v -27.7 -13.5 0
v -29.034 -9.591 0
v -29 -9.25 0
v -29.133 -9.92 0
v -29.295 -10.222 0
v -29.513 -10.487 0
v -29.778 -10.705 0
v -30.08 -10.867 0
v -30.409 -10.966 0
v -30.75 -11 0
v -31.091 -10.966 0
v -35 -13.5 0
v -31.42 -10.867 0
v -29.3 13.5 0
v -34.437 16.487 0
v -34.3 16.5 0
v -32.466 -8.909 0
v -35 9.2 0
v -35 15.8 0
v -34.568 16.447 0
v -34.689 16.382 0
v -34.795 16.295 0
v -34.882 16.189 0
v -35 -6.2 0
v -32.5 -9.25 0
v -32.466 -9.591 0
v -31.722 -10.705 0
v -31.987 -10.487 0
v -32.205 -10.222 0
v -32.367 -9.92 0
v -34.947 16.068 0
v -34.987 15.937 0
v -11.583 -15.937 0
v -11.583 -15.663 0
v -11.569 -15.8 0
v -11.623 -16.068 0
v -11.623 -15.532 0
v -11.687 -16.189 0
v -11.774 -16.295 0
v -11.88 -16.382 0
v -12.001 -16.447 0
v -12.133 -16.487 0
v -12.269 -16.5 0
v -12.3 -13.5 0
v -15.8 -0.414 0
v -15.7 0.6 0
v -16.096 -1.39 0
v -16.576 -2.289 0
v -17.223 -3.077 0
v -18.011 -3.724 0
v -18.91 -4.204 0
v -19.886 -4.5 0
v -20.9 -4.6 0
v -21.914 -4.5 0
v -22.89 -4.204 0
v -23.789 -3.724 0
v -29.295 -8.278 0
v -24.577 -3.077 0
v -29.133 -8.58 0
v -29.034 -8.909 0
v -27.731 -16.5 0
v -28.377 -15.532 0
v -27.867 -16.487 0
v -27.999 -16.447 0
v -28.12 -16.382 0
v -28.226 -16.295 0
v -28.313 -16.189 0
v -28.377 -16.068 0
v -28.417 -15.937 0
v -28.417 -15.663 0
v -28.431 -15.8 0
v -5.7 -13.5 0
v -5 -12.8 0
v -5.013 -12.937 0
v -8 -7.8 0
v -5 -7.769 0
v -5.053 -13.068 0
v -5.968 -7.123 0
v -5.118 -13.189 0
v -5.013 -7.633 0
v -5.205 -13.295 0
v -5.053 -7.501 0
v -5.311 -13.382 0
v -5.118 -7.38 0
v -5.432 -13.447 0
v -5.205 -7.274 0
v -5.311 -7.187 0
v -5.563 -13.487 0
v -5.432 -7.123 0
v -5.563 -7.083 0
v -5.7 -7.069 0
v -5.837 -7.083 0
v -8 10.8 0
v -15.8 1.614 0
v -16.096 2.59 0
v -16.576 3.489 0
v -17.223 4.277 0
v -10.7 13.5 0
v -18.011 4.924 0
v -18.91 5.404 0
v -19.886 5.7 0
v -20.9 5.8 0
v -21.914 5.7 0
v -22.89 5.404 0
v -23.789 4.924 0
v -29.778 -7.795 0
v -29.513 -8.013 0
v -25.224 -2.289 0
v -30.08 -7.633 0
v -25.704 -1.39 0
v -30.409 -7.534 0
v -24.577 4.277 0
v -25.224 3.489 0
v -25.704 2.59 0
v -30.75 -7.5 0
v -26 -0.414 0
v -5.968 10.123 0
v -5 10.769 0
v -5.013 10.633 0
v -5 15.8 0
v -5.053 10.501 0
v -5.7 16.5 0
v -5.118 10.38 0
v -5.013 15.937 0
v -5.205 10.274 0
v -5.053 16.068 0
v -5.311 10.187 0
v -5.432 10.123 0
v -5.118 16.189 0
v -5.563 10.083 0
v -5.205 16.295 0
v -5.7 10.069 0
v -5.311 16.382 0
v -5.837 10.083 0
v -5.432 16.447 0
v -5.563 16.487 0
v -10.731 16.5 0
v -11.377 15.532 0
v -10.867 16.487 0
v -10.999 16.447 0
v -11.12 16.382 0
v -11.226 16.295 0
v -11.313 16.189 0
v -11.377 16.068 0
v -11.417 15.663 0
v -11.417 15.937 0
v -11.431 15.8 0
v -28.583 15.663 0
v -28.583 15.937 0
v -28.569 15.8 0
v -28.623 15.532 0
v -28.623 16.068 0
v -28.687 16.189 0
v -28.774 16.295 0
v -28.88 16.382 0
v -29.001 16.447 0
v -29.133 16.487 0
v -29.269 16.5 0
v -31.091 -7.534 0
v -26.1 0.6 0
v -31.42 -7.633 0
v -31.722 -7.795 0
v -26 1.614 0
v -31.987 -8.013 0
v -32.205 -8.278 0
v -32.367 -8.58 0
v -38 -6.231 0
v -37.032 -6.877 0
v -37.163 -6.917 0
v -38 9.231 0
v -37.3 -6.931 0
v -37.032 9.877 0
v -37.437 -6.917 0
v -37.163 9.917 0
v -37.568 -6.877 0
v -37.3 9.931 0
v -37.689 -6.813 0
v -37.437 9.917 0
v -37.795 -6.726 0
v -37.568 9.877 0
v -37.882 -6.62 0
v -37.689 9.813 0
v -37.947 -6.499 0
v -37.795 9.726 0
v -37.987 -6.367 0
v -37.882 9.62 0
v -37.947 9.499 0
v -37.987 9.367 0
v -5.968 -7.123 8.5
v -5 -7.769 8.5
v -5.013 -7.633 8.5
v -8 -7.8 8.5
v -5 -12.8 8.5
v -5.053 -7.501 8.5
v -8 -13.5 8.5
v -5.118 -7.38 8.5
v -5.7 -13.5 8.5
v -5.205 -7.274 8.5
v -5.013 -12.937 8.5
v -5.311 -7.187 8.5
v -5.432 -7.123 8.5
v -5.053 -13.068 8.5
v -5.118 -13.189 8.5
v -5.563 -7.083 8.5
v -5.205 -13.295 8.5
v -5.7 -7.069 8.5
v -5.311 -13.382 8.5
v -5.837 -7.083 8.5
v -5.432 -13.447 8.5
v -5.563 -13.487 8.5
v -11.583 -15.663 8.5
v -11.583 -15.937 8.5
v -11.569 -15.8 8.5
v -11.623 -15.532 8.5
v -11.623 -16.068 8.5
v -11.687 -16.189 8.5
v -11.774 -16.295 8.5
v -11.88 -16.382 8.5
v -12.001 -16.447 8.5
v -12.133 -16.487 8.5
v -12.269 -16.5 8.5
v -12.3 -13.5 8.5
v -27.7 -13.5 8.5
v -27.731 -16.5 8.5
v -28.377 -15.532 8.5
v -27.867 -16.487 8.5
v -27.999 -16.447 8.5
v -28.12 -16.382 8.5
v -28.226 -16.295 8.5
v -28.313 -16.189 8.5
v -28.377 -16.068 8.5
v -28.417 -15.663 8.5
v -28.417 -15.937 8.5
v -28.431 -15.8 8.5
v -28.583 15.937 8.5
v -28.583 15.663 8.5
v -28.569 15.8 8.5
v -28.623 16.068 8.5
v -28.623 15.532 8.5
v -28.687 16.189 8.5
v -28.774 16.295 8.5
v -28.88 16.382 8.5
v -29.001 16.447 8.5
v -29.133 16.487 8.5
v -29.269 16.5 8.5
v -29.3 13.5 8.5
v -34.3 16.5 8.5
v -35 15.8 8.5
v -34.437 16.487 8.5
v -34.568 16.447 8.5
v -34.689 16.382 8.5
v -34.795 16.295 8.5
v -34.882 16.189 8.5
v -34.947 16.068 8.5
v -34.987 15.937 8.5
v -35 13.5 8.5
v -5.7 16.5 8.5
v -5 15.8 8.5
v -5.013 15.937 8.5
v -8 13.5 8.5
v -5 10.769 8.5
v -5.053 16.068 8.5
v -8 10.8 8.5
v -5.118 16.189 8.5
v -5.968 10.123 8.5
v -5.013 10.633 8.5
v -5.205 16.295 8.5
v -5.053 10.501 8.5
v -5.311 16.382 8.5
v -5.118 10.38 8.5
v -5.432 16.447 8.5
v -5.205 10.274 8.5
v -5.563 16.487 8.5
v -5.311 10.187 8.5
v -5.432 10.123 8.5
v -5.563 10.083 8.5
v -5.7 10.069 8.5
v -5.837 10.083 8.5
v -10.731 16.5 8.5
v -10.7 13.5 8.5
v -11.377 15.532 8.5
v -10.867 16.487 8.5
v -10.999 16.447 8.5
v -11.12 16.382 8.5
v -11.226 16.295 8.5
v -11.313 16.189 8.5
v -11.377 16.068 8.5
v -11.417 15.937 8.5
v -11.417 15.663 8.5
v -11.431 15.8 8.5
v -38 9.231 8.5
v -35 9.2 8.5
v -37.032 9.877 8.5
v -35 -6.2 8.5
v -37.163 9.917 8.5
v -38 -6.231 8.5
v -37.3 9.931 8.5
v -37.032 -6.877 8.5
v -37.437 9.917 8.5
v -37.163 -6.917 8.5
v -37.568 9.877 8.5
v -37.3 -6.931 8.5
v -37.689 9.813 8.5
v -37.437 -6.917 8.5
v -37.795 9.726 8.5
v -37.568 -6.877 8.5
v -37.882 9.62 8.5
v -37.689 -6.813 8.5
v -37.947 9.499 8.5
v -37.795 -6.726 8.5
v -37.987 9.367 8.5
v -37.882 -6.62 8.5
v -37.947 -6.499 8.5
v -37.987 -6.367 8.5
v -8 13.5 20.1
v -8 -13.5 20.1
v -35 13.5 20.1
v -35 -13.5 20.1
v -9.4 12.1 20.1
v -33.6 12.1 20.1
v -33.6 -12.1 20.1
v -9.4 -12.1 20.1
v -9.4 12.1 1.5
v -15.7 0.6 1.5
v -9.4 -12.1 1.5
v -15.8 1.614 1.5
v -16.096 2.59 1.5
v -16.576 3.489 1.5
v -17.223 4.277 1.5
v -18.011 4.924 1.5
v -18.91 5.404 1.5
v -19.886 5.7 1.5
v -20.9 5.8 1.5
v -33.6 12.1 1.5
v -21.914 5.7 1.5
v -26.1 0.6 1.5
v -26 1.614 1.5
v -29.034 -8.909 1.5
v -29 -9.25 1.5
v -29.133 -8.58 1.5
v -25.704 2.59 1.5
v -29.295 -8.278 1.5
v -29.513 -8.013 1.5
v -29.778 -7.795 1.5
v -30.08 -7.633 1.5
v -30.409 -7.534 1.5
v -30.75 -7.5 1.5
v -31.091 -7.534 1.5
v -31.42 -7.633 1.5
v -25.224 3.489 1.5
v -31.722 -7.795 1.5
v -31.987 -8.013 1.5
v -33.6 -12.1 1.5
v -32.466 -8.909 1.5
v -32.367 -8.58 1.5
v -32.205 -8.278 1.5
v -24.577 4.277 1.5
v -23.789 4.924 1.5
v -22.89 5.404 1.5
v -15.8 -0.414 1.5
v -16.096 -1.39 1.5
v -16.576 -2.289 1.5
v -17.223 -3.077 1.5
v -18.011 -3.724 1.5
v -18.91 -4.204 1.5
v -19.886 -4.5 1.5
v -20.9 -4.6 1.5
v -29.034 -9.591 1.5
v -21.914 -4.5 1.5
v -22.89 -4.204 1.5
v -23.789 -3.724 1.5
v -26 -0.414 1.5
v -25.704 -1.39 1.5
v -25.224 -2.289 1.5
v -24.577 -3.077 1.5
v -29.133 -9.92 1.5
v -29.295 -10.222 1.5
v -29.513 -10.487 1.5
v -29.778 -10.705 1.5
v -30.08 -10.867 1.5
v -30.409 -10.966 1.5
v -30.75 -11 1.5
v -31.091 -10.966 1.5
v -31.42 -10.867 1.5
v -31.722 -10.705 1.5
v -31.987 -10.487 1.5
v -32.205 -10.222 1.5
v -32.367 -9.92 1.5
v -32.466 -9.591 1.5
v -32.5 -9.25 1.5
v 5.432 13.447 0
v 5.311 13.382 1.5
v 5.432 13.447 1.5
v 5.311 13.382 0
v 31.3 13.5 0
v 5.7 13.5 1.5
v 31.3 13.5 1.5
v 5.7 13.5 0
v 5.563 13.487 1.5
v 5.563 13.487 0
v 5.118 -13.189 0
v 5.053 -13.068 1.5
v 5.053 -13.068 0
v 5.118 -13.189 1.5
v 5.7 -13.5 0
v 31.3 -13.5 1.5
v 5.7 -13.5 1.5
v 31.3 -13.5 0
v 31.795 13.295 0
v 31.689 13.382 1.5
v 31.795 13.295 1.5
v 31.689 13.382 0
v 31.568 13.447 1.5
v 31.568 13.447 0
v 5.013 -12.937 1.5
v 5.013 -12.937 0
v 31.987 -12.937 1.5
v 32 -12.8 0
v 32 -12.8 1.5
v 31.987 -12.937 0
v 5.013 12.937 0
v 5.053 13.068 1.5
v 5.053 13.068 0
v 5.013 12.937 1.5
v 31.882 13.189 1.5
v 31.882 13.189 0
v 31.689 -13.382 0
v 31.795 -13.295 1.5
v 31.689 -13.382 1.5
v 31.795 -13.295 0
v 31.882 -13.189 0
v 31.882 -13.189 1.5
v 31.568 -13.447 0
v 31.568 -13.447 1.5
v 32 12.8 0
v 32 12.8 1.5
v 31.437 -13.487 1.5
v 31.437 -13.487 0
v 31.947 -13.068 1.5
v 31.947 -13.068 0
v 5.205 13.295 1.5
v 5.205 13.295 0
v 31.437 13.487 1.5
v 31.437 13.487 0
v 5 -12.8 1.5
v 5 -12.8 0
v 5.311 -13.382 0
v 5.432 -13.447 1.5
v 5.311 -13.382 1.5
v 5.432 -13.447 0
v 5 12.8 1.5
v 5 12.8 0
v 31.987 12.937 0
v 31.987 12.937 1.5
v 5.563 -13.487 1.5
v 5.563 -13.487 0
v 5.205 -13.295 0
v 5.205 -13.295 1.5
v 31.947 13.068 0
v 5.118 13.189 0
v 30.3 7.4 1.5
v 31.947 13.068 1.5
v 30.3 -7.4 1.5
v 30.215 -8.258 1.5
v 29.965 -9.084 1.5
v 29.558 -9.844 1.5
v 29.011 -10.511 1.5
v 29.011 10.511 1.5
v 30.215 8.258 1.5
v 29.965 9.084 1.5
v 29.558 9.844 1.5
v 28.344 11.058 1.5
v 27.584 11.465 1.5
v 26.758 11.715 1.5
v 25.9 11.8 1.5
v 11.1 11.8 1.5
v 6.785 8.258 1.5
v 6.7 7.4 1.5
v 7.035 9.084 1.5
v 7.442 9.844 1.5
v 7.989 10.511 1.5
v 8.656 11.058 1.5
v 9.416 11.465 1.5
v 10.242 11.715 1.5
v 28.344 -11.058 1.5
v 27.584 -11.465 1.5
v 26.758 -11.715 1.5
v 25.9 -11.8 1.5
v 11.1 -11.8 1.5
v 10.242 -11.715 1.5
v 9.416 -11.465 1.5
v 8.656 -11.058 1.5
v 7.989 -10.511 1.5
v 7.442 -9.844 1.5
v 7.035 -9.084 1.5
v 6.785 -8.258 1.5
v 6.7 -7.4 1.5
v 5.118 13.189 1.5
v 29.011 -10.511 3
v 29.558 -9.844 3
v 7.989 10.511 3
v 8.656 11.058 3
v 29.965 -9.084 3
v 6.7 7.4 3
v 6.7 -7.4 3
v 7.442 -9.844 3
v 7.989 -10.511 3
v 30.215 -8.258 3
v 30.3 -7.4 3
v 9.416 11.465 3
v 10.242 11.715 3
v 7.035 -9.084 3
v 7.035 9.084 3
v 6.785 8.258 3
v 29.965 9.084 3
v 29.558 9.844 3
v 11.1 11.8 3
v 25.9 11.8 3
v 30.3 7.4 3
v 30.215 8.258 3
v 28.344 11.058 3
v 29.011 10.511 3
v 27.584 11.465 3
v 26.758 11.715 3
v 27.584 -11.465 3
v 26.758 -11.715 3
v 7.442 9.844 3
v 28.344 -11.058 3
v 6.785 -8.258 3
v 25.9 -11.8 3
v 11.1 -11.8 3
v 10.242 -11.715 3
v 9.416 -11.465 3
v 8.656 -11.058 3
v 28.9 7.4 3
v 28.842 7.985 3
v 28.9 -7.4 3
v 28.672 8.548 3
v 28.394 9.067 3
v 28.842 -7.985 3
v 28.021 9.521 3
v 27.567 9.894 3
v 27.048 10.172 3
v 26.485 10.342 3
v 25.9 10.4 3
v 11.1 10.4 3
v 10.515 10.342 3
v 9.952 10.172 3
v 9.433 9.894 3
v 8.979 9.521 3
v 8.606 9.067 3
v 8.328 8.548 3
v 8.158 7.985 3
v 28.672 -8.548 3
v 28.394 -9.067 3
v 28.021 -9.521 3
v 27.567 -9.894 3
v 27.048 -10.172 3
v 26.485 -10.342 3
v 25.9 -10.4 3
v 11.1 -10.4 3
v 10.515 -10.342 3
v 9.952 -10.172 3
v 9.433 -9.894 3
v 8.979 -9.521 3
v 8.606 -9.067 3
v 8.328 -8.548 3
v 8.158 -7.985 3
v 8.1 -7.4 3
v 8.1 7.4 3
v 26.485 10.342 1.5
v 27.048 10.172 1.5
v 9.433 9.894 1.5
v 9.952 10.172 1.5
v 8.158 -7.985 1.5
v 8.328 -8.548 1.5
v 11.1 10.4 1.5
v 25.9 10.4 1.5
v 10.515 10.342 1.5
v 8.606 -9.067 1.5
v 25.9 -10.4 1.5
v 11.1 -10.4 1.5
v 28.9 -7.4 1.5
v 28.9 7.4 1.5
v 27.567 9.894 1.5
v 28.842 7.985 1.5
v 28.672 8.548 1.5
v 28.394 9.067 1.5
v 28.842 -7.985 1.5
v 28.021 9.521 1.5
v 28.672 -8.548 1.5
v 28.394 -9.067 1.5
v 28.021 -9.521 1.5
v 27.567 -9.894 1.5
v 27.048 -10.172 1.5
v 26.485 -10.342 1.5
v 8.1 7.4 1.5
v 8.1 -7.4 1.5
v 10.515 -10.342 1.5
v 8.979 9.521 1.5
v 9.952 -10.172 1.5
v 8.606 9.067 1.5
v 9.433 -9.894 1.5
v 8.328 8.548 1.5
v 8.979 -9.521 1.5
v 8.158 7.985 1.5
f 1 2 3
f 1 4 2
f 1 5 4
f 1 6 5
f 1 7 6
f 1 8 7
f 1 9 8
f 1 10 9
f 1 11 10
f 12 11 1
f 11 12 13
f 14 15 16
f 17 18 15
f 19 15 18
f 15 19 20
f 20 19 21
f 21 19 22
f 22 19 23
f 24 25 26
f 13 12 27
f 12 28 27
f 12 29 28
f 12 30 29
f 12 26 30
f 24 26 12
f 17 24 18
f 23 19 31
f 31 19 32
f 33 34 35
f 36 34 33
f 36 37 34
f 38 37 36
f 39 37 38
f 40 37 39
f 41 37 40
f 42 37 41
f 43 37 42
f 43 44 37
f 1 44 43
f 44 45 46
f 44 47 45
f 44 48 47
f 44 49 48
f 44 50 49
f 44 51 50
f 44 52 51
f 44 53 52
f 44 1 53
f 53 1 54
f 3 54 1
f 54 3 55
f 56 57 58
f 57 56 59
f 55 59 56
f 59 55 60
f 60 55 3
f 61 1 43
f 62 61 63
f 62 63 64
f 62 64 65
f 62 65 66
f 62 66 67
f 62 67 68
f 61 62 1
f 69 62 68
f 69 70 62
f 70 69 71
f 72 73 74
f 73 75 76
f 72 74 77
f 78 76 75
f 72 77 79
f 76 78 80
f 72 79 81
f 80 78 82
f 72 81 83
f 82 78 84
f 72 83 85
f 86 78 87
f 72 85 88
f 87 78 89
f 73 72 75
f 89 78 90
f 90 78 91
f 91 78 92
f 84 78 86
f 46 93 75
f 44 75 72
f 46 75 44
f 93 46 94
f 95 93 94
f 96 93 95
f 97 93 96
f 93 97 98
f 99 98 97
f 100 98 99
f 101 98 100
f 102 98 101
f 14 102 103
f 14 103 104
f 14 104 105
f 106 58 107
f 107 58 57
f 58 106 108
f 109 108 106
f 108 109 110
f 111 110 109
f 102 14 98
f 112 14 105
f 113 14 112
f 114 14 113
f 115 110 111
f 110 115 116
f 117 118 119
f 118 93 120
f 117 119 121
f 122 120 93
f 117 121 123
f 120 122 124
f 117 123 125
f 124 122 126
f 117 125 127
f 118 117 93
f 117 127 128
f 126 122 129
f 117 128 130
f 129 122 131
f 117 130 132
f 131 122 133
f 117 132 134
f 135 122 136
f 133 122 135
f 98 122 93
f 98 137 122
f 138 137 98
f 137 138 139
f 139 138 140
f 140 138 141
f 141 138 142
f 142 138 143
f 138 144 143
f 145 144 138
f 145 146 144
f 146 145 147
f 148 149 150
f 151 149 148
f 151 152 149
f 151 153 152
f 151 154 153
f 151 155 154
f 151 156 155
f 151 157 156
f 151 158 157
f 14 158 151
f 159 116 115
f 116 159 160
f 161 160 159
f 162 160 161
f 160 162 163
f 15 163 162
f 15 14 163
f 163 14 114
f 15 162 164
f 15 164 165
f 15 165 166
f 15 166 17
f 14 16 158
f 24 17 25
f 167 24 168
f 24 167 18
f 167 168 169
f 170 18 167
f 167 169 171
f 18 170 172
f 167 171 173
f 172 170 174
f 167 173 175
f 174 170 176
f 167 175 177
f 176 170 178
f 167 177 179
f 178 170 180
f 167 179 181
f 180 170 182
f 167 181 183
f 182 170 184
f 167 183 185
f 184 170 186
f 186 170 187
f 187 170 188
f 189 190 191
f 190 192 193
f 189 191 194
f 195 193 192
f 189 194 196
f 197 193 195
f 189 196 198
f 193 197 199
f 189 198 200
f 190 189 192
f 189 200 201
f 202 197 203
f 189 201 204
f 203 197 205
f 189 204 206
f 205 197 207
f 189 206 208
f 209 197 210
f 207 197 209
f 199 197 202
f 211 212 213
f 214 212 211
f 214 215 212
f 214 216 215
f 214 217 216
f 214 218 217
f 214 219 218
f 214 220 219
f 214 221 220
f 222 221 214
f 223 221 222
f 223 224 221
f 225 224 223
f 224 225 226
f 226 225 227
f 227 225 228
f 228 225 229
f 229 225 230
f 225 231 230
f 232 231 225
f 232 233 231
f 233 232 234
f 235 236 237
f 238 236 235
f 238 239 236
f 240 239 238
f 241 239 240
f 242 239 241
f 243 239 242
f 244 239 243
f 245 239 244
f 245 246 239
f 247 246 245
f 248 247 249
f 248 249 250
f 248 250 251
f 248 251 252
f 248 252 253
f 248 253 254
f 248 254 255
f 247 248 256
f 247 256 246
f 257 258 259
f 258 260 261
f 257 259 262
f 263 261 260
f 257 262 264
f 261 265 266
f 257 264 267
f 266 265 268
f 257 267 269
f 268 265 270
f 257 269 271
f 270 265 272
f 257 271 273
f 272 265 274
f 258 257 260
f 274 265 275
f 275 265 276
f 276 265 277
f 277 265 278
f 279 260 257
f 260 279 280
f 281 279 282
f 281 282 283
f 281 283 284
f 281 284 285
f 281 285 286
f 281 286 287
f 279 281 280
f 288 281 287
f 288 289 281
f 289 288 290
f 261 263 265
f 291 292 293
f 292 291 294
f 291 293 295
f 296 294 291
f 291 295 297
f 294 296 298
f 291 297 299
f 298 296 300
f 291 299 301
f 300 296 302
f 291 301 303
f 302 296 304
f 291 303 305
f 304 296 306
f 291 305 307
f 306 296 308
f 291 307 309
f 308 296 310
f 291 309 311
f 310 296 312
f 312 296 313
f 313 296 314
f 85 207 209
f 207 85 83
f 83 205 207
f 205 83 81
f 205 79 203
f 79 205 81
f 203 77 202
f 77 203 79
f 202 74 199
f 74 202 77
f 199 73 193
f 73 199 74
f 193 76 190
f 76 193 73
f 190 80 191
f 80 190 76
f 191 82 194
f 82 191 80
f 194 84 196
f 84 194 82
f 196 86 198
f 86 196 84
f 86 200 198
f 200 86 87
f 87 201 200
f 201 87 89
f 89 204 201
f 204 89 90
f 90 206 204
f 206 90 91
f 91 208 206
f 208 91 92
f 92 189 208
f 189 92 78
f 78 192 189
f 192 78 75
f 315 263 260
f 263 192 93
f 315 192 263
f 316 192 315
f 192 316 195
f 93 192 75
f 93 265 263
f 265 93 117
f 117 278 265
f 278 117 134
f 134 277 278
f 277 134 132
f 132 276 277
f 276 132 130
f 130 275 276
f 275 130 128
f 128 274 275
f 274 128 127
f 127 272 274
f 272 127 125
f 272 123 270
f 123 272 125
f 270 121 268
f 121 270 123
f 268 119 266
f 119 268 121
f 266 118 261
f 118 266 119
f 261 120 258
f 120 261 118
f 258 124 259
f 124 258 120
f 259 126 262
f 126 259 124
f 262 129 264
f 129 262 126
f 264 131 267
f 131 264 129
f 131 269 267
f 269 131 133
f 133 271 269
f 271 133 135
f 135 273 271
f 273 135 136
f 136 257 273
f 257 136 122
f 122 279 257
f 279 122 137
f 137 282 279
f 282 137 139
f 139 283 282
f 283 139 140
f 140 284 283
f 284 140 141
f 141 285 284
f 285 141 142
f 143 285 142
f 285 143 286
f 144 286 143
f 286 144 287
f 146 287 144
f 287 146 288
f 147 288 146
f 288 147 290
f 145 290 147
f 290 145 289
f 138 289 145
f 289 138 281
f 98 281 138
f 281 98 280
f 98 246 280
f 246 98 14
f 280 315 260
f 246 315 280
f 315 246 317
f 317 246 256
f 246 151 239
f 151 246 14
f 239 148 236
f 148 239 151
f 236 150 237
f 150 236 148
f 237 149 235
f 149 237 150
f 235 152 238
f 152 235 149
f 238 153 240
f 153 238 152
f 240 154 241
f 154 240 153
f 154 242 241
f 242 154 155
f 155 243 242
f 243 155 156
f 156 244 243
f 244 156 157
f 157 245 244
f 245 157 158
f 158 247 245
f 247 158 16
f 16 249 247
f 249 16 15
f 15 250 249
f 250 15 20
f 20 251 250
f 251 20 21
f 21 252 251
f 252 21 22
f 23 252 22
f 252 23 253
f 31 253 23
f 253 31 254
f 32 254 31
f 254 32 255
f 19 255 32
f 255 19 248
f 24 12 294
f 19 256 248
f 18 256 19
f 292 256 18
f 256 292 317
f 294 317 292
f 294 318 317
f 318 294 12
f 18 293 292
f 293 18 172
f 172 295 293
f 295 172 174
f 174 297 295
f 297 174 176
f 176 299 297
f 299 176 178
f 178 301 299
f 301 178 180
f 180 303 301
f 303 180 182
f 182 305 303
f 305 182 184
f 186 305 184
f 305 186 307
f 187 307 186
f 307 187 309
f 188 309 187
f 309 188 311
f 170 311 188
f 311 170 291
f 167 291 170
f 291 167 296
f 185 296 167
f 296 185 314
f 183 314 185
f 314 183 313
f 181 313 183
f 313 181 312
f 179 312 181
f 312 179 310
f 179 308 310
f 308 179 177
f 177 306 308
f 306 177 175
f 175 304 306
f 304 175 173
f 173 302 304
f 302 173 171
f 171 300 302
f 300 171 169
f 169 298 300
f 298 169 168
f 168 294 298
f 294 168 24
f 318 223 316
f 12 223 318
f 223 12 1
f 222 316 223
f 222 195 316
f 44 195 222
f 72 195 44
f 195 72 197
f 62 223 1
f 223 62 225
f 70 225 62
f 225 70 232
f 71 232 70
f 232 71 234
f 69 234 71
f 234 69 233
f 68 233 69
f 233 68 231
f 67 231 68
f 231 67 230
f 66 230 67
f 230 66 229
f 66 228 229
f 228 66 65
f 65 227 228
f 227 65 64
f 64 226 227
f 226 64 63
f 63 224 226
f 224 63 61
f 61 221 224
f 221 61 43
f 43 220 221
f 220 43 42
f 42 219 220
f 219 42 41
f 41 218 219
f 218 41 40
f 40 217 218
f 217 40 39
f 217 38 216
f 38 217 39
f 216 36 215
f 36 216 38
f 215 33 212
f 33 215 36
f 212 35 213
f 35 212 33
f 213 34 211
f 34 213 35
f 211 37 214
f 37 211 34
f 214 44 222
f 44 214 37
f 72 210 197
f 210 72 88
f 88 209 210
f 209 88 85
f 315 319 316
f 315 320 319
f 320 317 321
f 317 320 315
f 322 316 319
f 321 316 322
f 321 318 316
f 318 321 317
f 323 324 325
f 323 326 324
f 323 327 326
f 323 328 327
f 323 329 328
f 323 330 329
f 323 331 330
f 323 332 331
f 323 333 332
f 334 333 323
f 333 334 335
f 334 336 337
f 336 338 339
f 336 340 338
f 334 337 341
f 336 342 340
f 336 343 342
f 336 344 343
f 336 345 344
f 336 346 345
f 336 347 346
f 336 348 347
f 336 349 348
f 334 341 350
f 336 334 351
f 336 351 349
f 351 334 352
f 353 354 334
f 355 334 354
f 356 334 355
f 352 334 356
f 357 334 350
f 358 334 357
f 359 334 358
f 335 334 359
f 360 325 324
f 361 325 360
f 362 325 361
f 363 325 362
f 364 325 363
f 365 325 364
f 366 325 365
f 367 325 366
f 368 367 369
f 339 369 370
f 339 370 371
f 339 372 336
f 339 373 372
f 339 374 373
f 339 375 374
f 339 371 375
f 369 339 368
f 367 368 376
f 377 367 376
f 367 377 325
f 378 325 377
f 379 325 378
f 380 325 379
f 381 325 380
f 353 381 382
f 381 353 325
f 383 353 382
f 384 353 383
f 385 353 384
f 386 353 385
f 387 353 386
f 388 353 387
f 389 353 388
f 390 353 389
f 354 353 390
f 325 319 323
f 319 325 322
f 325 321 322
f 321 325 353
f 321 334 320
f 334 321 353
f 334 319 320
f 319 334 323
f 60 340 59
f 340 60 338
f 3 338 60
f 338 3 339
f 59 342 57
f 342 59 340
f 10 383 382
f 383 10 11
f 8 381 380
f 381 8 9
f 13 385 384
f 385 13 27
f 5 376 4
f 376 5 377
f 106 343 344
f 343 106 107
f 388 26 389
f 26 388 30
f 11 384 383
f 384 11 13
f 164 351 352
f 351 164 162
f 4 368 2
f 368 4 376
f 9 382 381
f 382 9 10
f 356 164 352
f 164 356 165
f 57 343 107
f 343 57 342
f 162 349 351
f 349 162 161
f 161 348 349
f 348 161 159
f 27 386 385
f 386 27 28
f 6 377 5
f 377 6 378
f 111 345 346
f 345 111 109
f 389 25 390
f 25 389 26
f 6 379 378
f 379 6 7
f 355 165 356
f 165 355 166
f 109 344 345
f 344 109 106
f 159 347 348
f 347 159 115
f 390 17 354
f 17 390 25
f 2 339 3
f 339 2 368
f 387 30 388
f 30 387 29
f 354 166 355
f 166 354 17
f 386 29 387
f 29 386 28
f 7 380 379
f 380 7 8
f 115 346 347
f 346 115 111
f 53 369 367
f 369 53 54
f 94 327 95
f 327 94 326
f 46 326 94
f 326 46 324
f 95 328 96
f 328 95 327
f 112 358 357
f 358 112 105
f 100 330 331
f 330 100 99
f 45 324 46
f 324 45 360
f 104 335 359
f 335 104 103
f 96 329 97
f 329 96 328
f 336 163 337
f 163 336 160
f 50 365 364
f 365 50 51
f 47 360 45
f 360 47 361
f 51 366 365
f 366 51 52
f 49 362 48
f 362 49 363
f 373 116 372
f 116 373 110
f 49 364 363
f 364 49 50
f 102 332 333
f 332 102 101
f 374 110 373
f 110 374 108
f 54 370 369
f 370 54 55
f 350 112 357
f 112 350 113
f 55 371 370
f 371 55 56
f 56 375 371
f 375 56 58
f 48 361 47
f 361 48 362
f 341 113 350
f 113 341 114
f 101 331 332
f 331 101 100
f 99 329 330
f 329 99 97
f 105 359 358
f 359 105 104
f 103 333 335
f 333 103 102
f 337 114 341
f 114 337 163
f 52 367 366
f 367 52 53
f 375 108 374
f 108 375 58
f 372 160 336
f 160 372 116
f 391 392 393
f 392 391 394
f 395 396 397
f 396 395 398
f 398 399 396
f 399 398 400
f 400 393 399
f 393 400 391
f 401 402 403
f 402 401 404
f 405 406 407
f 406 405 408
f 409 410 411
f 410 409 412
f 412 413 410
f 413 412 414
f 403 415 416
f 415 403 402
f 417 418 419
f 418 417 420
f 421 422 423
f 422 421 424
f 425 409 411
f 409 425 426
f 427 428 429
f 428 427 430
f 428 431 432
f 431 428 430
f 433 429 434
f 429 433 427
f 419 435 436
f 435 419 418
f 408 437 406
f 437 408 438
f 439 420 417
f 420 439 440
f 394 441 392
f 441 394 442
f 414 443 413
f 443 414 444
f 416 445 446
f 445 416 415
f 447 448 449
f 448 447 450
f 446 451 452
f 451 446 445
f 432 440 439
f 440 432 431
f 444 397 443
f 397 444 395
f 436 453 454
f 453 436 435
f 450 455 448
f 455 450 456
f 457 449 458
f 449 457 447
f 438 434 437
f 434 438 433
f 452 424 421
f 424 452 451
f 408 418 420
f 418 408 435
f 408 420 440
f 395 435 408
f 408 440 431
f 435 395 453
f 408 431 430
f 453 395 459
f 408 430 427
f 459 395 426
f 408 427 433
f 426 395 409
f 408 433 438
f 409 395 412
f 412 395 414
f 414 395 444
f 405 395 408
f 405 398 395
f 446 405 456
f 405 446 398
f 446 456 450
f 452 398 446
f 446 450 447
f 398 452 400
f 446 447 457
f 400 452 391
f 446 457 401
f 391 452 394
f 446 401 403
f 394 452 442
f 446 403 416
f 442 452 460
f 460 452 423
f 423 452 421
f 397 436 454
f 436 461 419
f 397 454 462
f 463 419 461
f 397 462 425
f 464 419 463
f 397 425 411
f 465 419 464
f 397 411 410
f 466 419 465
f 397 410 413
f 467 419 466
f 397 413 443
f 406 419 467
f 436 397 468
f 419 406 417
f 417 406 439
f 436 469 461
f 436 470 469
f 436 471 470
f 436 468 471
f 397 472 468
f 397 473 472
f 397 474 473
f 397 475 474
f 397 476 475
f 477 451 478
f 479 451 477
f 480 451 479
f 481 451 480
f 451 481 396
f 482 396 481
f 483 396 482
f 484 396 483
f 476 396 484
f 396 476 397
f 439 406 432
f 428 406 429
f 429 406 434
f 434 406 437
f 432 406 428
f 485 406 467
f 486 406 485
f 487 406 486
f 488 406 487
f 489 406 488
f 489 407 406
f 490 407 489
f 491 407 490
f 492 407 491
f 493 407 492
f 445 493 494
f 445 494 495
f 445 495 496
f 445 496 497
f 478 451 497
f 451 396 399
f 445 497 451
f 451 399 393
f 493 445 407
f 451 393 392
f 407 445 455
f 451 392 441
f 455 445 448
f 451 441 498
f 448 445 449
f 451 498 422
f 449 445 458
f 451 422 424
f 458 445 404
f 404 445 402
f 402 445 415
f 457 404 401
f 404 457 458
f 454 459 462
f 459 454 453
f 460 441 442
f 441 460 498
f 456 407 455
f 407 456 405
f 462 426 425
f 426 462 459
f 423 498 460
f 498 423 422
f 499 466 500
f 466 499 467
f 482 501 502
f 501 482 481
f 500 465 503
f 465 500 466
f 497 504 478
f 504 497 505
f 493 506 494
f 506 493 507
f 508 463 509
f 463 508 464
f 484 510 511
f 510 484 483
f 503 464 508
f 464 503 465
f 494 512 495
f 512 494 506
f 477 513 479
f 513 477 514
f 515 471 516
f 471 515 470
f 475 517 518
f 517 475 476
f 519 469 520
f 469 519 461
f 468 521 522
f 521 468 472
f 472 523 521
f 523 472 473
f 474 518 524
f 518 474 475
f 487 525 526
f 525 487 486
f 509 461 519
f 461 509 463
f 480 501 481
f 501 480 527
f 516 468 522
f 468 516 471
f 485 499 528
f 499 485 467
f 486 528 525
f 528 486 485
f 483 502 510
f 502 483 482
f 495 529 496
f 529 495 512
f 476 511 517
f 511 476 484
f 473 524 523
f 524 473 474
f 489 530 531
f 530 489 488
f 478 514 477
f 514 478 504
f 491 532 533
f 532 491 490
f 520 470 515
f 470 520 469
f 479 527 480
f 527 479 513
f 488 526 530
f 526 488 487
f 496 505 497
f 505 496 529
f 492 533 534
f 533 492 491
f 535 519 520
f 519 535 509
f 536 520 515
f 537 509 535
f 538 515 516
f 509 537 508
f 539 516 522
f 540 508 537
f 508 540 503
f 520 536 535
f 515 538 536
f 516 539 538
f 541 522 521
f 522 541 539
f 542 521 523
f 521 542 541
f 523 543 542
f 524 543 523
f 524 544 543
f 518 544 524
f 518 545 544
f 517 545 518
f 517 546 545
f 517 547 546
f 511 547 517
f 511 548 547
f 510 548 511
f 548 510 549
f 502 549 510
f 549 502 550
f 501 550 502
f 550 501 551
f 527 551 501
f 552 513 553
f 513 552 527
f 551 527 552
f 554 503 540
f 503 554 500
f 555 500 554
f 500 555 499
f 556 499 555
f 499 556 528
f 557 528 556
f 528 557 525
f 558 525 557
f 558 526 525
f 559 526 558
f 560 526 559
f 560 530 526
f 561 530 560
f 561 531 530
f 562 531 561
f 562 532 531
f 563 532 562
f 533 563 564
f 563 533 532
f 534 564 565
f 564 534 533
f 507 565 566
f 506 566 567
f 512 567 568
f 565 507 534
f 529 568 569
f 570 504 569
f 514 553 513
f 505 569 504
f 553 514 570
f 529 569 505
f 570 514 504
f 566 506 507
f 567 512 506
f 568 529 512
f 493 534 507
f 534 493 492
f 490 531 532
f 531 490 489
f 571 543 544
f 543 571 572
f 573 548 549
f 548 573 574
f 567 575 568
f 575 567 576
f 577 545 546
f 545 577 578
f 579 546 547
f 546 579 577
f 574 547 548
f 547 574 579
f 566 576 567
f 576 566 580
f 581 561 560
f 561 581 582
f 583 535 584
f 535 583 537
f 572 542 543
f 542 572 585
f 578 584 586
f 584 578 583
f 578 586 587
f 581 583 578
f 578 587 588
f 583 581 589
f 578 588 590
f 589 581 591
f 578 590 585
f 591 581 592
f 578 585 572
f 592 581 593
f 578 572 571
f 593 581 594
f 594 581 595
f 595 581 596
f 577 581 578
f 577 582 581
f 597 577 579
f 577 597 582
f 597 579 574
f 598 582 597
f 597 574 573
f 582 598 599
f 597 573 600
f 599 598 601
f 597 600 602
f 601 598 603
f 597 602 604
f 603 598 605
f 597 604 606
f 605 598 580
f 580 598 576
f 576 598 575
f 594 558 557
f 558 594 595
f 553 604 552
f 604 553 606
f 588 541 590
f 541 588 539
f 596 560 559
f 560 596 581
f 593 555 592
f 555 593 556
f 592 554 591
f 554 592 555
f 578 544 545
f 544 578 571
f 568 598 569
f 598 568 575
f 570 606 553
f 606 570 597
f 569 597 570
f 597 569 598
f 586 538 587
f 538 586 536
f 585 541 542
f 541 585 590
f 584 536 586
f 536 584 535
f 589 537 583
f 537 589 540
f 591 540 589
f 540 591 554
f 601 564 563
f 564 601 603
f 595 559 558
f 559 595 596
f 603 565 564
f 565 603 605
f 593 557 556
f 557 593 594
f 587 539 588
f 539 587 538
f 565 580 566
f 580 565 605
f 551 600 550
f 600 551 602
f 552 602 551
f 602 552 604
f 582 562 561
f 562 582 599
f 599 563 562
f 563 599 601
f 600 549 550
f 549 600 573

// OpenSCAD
/********************************
Project:	Biblioduino
Date:		september 2014
Hubout Makers Lab
Designed by: Andrea Mantelli

Biblioduino is born in september 2014 at Hubout Makers Lab from an idea of Andrea Mantelli, Giorgio Rancilio, Andrea Sottocornola.
This work is licensed under a Creative Commons Attribution-ShareAlike 4.0 International License.
To read a copy of the licence goes to the web page:
http://creativecommons.org/licenses/by-sa/4.0/
*********************************/

// preview[view:south east, tilt:top]

// Which one would you like to see?
part = "both"; // [first:Personalized Box Only, second:Box Enclosure Only, both:Personalized Box and enclosure]

//Internal Lenght of the module
lenght_module = 1;  //[1:24, 2:54, 3:84, 4:110, 5:140]
x = lenght_module;

//Internal Widht of the module
width_module = 1;  //[1:24, 2:54, 3:84, 4:110, 5:140]
y = width_module;

//internal Height of the module (standard = 18.5)
internal_height = 18.5;      //[18.5 : 0.5 : 50]

hole_type = 0;          //[0:Circular, 1:Rectangular]
radius_hole = 5.2;      //[0.4 : 0.2 : 100]
rectangle_lenght =10;   //[1 : 100]    
rectangle_width = 10;   //[1 : 100]
h = internal_height+1.6;
s = h-11.6;



/* [Hidden] */
m = 3+0;          //profondità denti
t = 0.3+0;        //tolleranza
f = 0.7+0;        //raggio fillet
k = 7+0;          //larghezza dente
l = 1+0;          //strizione dente
a = 30+0;         //larghezza modulo
p = 1.4;          //spessore pareti
$fn=32;           //accuratezza circolare
//supplementar calculation constants
b1 = k+t;
b2 = k-l+t;
c1 = k-t;
c2 = k-l-t;

//////////////////////////////////////////////////////////////////////////////////

print_part();

//////////////////////////////////////////////////////////////////////////////////

module print_part() {
	if (part == "first") {
		personalized_box();
	} else if (part == "second") {
		box_enclosure();
	} else if (part == "both") {
		both();
	} else {
		both();
	}
}


//////////////////////////////////////////////////////////////////////////////////
//////////////////////////////////////////////////////////////////////////////////
//module constructing Biblioduino Boxes///////////////////////////////////////////
//////////////////////////////////////////////////////////////////////////////////
//////////////////////////////////////////////////////////////////////////////////

module base_shape() {
    
    union() { 
        
        for (j = [0:1:y-1]) {
            
            translate([0,j*a])
            
            for (i = [0:1:x-1]) {
                
                translate([i*a,0])
                polygon([[0,0],[b1,0],[b2,-m],[a-b2,-m],[a-b1,0],[a,0],[a,c1],[a-m,c2],[a-m,a-c2],[a,a-c1],[a,a],[a-c1,a],[a-c2,a-m],[c2,a-m],[c1,a],[0,a],[0,a-b1],[-m,a-b2],[-m,b2],[0,b1]],true);
            }
        }
    
    polygon([[p,p],[(a*x)-p-m,p],[(a*x)-p-m,(a*y)-p-m],[p,(a*y)-p-m]],true);
        
    }
}


//////////////////////////////////////////////////////////////////////////////////

module Box() {
    
    translate([-((a*x)-m)/2,-((a*y)-m)/2])
    difference() {
        union() {
            linear_extrude(height = s, center = false, convexity = 100, twist = 0)
            rounding(r=f)
            base_shape();
        
            linear_extrude(height = h, center = false, convexity = 100, twist = 0) 
            polygon([[0,0],[(a*x)-m,0],[(a*x)-m,(a*y)-m],[0,(a*y)-m]],true);
        }

        translate([0,0,1.5]) linear_extrude(height = h, center = false, convexity = 100, twist = 0) 
        polygon([[p,p],[(a*x)-p-m,p],[(a*x)-p-m,(a*y)-p-m],[p,(a*y)-p-m]],true);
    }
}




//////////////////////////////////////////////////////////////////////////////////

module personalized_box() {
    difference() {
    
        Box();
    
        translate([-(a*x/2)+5.75,-(a*y/2)+5.75])
        cylinder(20,d = 3.5,center=true);
    
        if (hole_type == 0)    {
            translate([0.6,0.6])
            cylinder(20,r = radius_hole,center=true);
        } 
        if (hole_type == 1)    {
            translate([1.8,1.8])
            cube([rectangle_lenght,rectangle_width,20],center=true);
        }
    }
}




//////////////////////////////////////////////////////////////////////////////////

module box_enclosure() {
    difference() {
        union() {
            linear_extrude(height = 1.5, center = false, convexity = 100, twist = 0)
            rounding(r=f)
            square([(a*x)-m,(a*y)-m], center = true);
    
            linear_extrude(height = 3, center = false, convexity = 100, twist = 0)
            rounding(r=3+p)
            square([(a*x)-m-2*p-2*t,(a*y)-m-2*p-2*t], center = true);
        }
        translate([0,0,1.5])
        linear_extrude(height = 3, center = false, convexity = 100, twist = 0)
        rounding(r=3)
        square([(a*x)-m-4*p-2*t,(a*y)-m-4*p-2*t], center = true);
    }
}

//////////////////////////////////////////////////////////////////////////////////

module both() {
    if (x>y) {
        translate([0, (((a*y)-m)/2)+8, 0]) personalized_box();
        translate([0, -(((a*y)-m)/2)-5, 0]) box_enclosure();
    }
    else {
        translate([-(((a*x)-m)/2)-8, 0, 0]) personalized_box();
        translate([(((a*x)-m)/2)+5, 0, 0]) box_enclosure();
    }
}



//////////////////////////////////////////////////////////////////////////////////
// morphology.scad
// Copyright (c) 2013 Oskar Linde. All rights reserved.
// License: BSD
//
// This library contains basic 2D morphology operations
//
// outset(d=1)            - creates a polygon at an offset d outside a 2D shape
// inset(d=1)             - creates a polygon at an offset d inside a 2D shape
// fillet(r=1)            - adds fillets of radius r to all concave corners of a 2D shape
// rounding(r=1)          - adds rounding to all convex corners of a 2D shape
// shell(d,center=false)  - makes a shell of width d along the edge of a 2D shape
//                        - positive values of d places the shell on the outside
//                        - negative values of d places the shell on the inside
//                        - center=true and positive d places the shell centered on the edge
//////////////////////////////////////////////////////////////////////////////////

module outset(d=1) {
	// Bug workaround for older OpenSCAD versions
	if (version_num() < 20130424) render() outset_extruded(d) children();
	else minkowski() {
		circle(r=d);
		children();
	}
}

module outset_extruded(d=1) {
   projection(cut=true) minkowski() {
        cylinder(r=d);
        linear_extrude(center=true) children();
   }
}

module inset(d=1) {
	 render() inverse() outset(d=d) inverse() children();
}

module fillet(r=1) {
	inset(d=r) render() outset(d=r) children();
}

module rounding(r=1) {
	outset(d=r) inset(d=r) children();
}

module shell(d,center=false) {
	if (center && d > 0) {
		difference() {
			outset(d=d/2) children();
			inset(d=d/2) children();
		}
	}
	if (!center && d > 0) {
		difference() {
			outset(d=d) children();
			children();
		}
	}
	if (!center && d < 0) {
		difference() {
			children();
			inset(d=-d) children();
		}
	}
	if (d == 0) children();
}


// Below are for internal use only

module inverse() {
	difference() {
		square(1e5,center=true);
		children();
	}
}
//////////////////////////////////////////////////////////////////////////////////
